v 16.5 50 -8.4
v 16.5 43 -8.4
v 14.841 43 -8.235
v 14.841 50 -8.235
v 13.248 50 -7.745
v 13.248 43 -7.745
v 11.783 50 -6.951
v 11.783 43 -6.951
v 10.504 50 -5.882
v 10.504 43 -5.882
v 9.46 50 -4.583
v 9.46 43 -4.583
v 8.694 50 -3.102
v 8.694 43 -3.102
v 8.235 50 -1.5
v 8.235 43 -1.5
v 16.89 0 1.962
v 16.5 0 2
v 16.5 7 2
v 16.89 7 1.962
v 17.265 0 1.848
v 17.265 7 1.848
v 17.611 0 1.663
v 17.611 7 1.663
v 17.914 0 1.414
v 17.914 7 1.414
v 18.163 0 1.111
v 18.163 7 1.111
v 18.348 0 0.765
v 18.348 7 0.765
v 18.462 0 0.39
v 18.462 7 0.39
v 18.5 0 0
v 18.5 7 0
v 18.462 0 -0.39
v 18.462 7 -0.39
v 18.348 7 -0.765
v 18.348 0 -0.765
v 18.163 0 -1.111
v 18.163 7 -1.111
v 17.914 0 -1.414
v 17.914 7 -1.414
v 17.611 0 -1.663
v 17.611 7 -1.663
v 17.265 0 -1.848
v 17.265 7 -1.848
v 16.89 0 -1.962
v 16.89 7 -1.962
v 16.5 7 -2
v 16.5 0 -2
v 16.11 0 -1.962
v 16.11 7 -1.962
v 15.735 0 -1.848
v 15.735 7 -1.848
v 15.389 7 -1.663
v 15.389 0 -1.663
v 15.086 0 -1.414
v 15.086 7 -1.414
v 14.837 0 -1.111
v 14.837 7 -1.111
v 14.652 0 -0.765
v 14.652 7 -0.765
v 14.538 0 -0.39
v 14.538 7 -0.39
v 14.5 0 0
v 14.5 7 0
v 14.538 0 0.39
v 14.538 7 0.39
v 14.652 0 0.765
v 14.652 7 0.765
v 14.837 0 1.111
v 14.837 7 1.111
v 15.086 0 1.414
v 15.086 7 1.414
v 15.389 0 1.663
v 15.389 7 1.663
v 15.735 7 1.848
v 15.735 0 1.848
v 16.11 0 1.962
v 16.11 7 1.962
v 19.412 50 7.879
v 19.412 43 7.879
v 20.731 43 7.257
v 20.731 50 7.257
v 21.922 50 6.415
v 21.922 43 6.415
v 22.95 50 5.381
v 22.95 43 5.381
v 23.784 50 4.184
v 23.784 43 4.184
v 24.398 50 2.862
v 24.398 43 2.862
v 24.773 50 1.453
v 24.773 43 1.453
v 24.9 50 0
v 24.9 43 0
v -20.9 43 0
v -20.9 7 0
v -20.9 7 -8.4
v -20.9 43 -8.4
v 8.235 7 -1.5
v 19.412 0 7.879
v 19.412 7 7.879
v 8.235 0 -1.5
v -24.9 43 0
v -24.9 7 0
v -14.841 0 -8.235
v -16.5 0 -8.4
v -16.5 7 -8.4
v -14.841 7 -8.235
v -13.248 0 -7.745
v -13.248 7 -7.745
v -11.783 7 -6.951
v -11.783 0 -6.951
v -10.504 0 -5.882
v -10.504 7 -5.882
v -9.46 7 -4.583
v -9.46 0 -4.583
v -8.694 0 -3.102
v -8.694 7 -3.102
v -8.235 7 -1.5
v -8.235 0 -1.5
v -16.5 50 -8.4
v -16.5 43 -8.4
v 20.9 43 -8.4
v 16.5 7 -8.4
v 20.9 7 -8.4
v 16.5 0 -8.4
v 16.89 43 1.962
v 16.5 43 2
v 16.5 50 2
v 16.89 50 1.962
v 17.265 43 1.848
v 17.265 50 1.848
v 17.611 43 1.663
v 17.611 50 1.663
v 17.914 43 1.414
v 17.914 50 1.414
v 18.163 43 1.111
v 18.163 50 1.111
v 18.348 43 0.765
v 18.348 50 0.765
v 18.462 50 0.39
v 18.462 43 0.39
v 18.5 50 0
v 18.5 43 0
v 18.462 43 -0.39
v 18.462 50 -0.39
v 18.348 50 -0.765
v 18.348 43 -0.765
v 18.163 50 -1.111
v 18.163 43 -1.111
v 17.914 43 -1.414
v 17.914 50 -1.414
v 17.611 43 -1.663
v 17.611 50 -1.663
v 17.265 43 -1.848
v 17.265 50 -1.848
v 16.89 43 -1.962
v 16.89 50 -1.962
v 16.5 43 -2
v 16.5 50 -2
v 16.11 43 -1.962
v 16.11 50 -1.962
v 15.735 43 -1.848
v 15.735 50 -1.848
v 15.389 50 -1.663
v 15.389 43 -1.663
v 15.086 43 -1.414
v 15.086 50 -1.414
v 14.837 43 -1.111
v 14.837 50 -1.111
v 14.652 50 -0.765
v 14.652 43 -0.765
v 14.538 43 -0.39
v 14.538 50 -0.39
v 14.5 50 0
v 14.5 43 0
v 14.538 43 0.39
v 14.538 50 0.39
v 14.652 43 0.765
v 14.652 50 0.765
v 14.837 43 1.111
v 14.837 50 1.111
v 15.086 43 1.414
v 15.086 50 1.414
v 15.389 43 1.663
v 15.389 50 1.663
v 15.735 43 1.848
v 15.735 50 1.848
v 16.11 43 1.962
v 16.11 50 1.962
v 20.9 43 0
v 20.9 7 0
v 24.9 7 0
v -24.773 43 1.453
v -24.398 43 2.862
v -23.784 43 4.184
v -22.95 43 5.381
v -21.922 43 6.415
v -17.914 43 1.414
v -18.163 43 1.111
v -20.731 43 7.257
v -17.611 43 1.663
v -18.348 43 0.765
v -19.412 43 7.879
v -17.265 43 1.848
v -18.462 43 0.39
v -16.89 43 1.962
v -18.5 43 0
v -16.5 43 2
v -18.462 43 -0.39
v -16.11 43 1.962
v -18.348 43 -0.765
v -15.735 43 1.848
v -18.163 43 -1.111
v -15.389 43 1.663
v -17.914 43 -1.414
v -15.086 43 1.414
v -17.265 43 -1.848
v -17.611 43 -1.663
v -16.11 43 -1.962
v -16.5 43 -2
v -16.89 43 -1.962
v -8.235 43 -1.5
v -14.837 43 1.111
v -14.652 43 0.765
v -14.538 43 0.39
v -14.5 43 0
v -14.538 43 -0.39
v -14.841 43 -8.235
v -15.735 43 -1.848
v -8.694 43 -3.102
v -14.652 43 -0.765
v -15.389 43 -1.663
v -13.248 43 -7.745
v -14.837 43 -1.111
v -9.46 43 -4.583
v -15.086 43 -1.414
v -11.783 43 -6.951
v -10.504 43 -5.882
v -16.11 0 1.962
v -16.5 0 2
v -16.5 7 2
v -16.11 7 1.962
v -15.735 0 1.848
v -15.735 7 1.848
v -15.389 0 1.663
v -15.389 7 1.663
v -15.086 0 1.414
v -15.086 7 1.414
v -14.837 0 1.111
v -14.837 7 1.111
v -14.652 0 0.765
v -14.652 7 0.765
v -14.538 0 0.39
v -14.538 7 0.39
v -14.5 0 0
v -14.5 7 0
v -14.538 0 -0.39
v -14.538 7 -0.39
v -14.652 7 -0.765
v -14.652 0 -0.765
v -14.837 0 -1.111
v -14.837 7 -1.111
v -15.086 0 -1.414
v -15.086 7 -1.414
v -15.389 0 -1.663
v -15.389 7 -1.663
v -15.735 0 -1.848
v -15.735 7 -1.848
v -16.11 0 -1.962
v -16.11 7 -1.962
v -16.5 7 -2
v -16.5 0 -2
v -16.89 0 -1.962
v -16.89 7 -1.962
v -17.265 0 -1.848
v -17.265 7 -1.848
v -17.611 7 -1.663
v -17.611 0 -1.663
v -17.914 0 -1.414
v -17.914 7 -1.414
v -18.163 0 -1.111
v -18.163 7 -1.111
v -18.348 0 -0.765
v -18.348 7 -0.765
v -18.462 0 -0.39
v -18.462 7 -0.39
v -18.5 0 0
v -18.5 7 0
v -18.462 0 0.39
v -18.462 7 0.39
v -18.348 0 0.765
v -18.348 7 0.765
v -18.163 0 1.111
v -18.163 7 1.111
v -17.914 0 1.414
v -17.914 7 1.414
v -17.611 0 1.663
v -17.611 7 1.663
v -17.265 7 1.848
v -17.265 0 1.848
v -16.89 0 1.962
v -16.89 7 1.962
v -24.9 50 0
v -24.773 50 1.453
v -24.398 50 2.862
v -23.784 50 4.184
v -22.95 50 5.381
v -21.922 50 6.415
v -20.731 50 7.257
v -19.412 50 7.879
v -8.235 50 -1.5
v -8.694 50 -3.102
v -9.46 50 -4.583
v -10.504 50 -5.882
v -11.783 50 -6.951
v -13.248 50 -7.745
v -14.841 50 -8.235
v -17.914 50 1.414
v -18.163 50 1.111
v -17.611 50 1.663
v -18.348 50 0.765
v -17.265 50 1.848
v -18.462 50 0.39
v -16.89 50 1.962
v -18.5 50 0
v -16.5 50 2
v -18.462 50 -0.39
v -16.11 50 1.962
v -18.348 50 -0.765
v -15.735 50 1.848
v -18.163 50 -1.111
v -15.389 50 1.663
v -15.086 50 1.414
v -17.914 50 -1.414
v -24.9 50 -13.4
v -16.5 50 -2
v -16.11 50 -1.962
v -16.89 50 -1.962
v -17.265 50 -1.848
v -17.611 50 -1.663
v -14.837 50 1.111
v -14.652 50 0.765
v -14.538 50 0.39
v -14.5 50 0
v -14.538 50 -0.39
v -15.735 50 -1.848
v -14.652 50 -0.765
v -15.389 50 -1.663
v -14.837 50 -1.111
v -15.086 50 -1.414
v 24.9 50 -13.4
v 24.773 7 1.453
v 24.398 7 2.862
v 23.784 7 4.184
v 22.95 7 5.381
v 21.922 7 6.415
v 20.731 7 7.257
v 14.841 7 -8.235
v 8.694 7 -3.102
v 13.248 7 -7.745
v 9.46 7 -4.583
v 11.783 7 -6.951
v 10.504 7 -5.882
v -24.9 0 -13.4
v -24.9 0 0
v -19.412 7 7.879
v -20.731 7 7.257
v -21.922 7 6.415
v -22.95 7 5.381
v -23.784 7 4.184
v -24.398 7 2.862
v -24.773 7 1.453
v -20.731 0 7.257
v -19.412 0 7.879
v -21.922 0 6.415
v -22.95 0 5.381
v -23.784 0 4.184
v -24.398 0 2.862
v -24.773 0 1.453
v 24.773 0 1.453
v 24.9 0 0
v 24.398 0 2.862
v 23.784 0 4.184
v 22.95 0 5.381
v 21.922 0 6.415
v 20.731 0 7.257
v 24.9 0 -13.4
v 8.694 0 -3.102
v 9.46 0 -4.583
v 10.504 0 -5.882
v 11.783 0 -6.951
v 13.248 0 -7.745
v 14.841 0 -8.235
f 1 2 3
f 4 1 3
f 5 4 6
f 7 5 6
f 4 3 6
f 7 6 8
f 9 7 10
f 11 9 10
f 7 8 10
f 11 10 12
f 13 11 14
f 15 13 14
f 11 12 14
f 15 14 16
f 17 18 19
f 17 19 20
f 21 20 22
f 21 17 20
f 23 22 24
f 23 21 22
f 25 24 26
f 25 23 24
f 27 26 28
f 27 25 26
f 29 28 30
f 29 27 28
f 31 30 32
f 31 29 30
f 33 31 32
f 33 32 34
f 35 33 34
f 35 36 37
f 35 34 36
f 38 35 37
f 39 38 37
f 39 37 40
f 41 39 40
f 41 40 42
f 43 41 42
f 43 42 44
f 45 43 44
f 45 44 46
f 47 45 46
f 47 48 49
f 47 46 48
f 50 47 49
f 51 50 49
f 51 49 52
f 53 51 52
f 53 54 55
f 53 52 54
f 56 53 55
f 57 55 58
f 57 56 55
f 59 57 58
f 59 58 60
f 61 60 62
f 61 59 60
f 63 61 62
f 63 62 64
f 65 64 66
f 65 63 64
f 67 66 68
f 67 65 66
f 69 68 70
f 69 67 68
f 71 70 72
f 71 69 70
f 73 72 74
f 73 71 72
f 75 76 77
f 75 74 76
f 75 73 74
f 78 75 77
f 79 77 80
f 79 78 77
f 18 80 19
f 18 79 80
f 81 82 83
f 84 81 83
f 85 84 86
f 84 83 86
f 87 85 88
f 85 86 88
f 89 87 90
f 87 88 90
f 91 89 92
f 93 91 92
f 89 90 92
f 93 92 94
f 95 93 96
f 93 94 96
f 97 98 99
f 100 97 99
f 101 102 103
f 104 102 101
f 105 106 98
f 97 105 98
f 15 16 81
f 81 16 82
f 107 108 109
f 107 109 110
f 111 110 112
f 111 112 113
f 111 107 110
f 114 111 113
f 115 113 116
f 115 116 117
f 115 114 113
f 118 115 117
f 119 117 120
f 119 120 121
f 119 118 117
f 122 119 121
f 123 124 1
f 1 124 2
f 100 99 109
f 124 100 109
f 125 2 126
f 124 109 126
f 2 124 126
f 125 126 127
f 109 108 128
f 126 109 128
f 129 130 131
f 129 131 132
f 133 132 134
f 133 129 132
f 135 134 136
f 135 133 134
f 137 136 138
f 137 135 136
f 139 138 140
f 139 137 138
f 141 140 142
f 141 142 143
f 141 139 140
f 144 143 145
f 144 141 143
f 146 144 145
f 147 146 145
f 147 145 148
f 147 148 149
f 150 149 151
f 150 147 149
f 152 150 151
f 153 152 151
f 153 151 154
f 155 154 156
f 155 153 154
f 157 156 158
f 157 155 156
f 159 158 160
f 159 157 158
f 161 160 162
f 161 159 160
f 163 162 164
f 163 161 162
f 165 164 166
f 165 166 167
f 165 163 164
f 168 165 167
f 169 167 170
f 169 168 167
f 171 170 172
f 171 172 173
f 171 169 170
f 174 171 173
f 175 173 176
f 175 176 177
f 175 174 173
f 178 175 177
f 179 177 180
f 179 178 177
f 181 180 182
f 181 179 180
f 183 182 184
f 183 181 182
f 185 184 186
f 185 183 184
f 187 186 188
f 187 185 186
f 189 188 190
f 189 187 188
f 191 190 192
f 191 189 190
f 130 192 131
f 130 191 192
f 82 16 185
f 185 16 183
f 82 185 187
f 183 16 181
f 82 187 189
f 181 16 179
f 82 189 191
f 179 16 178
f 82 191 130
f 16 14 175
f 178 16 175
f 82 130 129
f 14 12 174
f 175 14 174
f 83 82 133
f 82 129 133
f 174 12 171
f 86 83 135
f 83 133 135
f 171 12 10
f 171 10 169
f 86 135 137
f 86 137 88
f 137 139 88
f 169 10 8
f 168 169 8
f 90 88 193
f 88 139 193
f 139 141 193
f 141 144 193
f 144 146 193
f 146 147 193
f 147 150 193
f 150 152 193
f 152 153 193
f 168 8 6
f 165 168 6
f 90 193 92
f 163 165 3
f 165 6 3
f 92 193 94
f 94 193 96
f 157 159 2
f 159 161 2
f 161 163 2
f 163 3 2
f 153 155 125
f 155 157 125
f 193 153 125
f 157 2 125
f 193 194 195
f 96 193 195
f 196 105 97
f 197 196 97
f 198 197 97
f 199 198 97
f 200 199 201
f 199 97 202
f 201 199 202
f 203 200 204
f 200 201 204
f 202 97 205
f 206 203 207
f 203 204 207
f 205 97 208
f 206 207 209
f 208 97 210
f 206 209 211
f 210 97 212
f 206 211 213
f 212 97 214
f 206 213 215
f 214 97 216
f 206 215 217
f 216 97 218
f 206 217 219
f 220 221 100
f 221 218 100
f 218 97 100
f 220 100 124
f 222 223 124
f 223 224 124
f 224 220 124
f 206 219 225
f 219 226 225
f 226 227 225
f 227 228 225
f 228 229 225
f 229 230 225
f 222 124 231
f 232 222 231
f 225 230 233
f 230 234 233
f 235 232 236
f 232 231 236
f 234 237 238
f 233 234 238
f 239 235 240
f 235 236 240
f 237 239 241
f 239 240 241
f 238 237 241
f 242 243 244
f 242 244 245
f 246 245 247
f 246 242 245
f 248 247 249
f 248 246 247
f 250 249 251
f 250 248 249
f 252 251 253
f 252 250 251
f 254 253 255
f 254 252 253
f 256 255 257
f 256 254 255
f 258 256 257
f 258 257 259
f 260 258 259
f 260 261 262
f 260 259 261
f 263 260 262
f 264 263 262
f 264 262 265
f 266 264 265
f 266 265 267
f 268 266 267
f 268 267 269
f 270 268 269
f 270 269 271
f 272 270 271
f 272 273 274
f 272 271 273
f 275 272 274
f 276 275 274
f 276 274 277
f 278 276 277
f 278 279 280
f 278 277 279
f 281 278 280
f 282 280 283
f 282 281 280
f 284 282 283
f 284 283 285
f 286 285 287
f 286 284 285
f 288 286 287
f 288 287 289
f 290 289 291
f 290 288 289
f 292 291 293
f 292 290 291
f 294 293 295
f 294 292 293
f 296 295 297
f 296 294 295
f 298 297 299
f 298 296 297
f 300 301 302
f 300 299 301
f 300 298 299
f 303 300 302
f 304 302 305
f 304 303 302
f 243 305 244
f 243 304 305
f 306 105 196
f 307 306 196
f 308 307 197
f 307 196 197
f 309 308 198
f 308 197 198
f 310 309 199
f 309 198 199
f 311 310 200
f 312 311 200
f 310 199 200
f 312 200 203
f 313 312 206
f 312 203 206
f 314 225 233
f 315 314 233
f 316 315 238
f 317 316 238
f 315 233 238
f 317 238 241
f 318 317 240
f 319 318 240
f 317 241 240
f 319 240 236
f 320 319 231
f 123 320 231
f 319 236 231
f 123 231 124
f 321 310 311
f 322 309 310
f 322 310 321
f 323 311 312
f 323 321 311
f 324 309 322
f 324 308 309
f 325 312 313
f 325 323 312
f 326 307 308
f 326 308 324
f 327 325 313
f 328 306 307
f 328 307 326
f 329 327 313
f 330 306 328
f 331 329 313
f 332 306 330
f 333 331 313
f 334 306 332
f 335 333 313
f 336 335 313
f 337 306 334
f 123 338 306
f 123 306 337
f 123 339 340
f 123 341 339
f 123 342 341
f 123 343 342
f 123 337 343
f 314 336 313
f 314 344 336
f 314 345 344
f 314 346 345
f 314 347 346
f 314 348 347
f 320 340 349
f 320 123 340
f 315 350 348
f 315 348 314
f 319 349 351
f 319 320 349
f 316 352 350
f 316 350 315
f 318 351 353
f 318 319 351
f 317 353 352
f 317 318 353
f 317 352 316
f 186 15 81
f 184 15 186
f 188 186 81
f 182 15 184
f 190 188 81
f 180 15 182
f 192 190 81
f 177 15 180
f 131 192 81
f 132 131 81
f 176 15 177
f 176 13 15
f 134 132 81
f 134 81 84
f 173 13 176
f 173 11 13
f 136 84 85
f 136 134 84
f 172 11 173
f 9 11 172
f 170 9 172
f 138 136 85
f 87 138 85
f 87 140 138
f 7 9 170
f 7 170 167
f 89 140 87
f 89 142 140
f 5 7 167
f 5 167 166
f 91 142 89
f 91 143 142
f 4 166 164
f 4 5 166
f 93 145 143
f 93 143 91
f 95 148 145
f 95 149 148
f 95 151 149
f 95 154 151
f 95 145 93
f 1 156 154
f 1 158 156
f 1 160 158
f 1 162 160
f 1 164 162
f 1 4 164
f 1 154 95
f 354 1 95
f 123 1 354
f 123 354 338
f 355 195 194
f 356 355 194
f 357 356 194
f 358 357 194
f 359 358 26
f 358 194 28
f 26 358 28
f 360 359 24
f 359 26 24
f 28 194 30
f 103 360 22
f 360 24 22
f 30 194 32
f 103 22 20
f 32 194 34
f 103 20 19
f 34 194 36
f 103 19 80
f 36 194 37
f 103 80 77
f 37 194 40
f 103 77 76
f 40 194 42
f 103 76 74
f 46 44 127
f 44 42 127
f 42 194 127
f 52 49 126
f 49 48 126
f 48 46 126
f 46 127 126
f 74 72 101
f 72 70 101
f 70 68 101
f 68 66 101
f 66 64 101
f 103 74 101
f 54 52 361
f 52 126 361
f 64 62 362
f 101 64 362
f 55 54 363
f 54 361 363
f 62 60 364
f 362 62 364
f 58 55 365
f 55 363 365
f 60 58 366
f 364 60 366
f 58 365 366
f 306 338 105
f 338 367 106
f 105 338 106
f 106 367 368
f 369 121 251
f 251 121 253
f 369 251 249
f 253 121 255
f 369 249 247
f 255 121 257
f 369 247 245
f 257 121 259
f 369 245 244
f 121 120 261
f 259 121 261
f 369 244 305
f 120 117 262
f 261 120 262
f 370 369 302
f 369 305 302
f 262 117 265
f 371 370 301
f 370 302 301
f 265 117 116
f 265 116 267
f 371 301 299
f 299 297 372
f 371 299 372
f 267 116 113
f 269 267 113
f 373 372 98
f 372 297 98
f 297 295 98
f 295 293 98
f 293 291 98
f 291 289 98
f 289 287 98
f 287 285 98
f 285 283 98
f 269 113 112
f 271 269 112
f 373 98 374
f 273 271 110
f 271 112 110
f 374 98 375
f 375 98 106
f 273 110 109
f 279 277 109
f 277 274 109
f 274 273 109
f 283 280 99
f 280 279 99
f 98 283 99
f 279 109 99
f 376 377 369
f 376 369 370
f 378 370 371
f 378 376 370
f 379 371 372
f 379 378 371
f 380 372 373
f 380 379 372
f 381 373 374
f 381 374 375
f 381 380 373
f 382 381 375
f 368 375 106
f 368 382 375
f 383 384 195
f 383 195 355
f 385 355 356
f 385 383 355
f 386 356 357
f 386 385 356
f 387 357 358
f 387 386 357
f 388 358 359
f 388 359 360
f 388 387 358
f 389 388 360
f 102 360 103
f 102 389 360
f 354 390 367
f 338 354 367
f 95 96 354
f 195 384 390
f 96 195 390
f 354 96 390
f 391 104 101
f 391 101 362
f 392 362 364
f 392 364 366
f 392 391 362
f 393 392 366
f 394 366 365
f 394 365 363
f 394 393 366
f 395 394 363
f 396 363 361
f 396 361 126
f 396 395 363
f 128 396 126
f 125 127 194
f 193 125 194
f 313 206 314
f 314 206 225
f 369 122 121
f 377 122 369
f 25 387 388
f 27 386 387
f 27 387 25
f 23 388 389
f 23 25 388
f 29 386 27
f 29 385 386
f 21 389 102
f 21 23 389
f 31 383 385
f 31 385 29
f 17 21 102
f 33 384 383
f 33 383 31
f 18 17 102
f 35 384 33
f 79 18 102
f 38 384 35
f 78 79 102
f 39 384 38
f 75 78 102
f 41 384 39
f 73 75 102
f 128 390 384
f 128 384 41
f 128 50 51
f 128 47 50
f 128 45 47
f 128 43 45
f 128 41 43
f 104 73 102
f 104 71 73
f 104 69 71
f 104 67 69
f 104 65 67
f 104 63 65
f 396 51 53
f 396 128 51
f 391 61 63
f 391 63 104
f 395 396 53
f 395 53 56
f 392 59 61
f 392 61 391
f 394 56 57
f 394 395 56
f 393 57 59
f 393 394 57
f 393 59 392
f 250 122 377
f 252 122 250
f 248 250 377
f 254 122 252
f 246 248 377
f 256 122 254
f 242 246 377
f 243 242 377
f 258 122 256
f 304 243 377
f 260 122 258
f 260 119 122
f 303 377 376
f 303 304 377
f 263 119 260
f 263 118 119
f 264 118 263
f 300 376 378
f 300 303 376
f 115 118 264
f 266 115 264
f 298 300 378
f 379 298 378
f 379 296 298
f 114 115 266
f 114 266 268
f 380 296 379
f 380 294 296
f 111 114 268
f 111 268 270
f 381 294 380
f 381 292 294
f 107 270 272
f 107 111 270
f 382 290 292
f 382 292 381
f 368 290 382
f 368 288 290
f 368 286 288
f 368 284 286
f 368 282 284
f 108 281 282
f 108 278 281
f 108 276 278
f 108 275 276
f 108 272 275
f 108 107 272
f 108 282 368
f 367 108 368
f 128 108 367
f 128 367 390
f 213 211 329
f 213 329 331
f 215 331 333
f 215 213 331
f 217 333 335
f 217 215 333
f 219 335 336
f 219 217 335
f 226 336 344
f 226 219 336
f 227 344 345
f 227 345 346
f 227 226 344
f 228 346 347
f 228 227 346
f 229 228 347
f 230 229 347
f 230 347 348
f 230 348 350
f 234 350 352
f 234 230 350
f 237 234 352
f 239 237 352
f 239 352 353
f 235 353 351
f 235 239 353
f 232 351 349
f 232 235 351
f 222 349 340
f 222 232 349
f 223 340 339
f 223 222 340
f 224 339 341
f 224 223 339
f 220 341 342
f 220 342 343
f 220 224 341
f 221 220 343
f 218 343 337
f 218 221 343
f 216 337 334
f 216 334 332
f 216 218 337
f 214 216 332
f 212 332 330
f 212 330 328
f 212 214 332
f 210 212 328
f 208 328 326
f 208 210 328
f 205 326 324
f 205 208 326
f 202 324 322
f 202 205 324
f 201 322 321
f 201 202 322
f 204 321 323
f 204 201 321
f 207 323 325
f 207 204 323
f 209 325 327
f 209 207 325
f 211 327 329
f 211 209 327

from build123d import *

# Parameters (mm, degrees)
BOSS_EXTRUDE2_DEPTH     = 7
CUT_EXTRUDE2_DEPTH      = 30.130224853
CUT_EXTRUDE2_DEPTH_BACK = 30.130224853
SKETCH3_R               = 2
BOSS_EXTRUDE3_DEPTH     = 36
SKETCH5_R               = 2
BOSS_EXTRUDE4_DEPTH     = 7


with BuildPart() as part:
    # Sketch1 → Boss-Extrude2 (new body)
    with BuildSketch(Plane(origin=(0, 0, 0), x_dir=(1, 0, 0), z_dir=(0, 1, 0))):
        with BuildLine():
            Line((-24.9, 0), (-24.9, 13.4))
            Line((-24.9, 13.4), (24.9, 13.4))
            Line((24.9, 13.4), (24.9, 0))
            ThreePointArc((24.9, 0), (23.392904185, -4.800819919), (19.412411454, -7.878950407))
            Line((19.412411454, -7.878950407), (8.235013612, 1.5))
            ThreePointArc((8.235013612, 1.5), (11.116692467, 6.448255578), (16.5, 8.4))
            Line((16.5, 8.4), (-16.5, 8.4))
            ThreePointArc((-16.5, 8.4), (-11.116692467, 6.448255578), (-8.235013612, 1.5))
            Line((-8.235013612, 1.5), (-19.412411454, -7.878950407))
            ThreePointArc((-19.412411454, -7.878950407), (-23.392904185, -4.800819919), (-24.9, 0))
        make_face()
    extrude(amount=BOSS_EXTRUDE2_DEPTH)

    # Sketch3 → Cut-Extrude2 (cut, two sides: drawn at the far end of the back side and taken through both)
    with BuildSketch(Plane(origin=(0, 7, 0), x_dir=(1, 0, 0), z_dir=(0, 1, 0)).offset(-CUT_EXTRUDE2_DEPTH_BACK)):
        with Locations(Location((-16.5, 0, 0), (0, 0, 270))):
            Circle(SKETCH3_R)
        with Locations(Location((16.5, 0, 0), (0, 0, 270))):
            Circle(SKETCH3_R)
    extrude(amount=CUT_EXTRUDE2_DEPTH + CUT_EXTRUDE2_DEPTH_BACK, mode=Mode.SUBTRACT)

    # Sketch4 → Boss-Extrude3 (add)
    with BuildSketch(Plane(origin=(0, 7, 0), x_dir=(1, 0, 0), z_dir=(0, 1, 0))):
        Polygon((-24.9, 13.4), (-24.9, 0), (-20.9, 0), (-20.9, 8.4), (-16.5, 8.4), (16.5, 8.4), (20.9, 8.4), (20.9, 0), (24.9, 0), (24.9, 13.4), align=None)
    extrude(amount=BOSS_EXTRUDE3_DEPTH)

    # Sketch5 → Boss-Extrude4 (add)
    with BuildSketch(Plane(origin=(0, 43, 0), x_dir=(1, 0, 0), z_dir=(0, 1, 0))):
        with BuildLine():
            Line((-24.9, 13.4), (-24.9, 0))
            ThreePointArc((-24.9, 0), (-23.392904185, -4.800819919), (-19.412411454, -7.878950407))
            Line((-19.412411454, -7.878950407), (-8.235013612, 1.5))
            ThreePointArc((-8.235013612, 1.5), (-11.116692467, 6.448255578), (-16.5, 8.4))
            Line((-16.5, 8.4), (16.5, 8.4))
            ThreePointArc((16.5, 8.4), (11.116692467, 6.448255578), (8.235013612, 1.5))
            Line((8.235013612, 1.5), (19.412411454, -7.878950407))
            ThreePointArc((19.412411454, -7.878950407), (23.392904185, -4.800819919), (24.9, 0))
            Line((24.9, 0), (24.9, 13.4))
            Line((24.9, 13.4), (-24.9, 13.4))
        make_face()
        with Locations(Location((16.5, 0, 0), (0, 0, 270))):
            Circle(SKETCH5_R, mode=Mode.SUBTRACT)
        with Locations(Location((-16.5, 0, 0), (0, 0, 270))):
            Circle(SKETCH5_R, mode=Mode.SUBTRACT)
    extrude(amount=BOSS_EXTRUDE4_DEPTH)


solid = part.part
